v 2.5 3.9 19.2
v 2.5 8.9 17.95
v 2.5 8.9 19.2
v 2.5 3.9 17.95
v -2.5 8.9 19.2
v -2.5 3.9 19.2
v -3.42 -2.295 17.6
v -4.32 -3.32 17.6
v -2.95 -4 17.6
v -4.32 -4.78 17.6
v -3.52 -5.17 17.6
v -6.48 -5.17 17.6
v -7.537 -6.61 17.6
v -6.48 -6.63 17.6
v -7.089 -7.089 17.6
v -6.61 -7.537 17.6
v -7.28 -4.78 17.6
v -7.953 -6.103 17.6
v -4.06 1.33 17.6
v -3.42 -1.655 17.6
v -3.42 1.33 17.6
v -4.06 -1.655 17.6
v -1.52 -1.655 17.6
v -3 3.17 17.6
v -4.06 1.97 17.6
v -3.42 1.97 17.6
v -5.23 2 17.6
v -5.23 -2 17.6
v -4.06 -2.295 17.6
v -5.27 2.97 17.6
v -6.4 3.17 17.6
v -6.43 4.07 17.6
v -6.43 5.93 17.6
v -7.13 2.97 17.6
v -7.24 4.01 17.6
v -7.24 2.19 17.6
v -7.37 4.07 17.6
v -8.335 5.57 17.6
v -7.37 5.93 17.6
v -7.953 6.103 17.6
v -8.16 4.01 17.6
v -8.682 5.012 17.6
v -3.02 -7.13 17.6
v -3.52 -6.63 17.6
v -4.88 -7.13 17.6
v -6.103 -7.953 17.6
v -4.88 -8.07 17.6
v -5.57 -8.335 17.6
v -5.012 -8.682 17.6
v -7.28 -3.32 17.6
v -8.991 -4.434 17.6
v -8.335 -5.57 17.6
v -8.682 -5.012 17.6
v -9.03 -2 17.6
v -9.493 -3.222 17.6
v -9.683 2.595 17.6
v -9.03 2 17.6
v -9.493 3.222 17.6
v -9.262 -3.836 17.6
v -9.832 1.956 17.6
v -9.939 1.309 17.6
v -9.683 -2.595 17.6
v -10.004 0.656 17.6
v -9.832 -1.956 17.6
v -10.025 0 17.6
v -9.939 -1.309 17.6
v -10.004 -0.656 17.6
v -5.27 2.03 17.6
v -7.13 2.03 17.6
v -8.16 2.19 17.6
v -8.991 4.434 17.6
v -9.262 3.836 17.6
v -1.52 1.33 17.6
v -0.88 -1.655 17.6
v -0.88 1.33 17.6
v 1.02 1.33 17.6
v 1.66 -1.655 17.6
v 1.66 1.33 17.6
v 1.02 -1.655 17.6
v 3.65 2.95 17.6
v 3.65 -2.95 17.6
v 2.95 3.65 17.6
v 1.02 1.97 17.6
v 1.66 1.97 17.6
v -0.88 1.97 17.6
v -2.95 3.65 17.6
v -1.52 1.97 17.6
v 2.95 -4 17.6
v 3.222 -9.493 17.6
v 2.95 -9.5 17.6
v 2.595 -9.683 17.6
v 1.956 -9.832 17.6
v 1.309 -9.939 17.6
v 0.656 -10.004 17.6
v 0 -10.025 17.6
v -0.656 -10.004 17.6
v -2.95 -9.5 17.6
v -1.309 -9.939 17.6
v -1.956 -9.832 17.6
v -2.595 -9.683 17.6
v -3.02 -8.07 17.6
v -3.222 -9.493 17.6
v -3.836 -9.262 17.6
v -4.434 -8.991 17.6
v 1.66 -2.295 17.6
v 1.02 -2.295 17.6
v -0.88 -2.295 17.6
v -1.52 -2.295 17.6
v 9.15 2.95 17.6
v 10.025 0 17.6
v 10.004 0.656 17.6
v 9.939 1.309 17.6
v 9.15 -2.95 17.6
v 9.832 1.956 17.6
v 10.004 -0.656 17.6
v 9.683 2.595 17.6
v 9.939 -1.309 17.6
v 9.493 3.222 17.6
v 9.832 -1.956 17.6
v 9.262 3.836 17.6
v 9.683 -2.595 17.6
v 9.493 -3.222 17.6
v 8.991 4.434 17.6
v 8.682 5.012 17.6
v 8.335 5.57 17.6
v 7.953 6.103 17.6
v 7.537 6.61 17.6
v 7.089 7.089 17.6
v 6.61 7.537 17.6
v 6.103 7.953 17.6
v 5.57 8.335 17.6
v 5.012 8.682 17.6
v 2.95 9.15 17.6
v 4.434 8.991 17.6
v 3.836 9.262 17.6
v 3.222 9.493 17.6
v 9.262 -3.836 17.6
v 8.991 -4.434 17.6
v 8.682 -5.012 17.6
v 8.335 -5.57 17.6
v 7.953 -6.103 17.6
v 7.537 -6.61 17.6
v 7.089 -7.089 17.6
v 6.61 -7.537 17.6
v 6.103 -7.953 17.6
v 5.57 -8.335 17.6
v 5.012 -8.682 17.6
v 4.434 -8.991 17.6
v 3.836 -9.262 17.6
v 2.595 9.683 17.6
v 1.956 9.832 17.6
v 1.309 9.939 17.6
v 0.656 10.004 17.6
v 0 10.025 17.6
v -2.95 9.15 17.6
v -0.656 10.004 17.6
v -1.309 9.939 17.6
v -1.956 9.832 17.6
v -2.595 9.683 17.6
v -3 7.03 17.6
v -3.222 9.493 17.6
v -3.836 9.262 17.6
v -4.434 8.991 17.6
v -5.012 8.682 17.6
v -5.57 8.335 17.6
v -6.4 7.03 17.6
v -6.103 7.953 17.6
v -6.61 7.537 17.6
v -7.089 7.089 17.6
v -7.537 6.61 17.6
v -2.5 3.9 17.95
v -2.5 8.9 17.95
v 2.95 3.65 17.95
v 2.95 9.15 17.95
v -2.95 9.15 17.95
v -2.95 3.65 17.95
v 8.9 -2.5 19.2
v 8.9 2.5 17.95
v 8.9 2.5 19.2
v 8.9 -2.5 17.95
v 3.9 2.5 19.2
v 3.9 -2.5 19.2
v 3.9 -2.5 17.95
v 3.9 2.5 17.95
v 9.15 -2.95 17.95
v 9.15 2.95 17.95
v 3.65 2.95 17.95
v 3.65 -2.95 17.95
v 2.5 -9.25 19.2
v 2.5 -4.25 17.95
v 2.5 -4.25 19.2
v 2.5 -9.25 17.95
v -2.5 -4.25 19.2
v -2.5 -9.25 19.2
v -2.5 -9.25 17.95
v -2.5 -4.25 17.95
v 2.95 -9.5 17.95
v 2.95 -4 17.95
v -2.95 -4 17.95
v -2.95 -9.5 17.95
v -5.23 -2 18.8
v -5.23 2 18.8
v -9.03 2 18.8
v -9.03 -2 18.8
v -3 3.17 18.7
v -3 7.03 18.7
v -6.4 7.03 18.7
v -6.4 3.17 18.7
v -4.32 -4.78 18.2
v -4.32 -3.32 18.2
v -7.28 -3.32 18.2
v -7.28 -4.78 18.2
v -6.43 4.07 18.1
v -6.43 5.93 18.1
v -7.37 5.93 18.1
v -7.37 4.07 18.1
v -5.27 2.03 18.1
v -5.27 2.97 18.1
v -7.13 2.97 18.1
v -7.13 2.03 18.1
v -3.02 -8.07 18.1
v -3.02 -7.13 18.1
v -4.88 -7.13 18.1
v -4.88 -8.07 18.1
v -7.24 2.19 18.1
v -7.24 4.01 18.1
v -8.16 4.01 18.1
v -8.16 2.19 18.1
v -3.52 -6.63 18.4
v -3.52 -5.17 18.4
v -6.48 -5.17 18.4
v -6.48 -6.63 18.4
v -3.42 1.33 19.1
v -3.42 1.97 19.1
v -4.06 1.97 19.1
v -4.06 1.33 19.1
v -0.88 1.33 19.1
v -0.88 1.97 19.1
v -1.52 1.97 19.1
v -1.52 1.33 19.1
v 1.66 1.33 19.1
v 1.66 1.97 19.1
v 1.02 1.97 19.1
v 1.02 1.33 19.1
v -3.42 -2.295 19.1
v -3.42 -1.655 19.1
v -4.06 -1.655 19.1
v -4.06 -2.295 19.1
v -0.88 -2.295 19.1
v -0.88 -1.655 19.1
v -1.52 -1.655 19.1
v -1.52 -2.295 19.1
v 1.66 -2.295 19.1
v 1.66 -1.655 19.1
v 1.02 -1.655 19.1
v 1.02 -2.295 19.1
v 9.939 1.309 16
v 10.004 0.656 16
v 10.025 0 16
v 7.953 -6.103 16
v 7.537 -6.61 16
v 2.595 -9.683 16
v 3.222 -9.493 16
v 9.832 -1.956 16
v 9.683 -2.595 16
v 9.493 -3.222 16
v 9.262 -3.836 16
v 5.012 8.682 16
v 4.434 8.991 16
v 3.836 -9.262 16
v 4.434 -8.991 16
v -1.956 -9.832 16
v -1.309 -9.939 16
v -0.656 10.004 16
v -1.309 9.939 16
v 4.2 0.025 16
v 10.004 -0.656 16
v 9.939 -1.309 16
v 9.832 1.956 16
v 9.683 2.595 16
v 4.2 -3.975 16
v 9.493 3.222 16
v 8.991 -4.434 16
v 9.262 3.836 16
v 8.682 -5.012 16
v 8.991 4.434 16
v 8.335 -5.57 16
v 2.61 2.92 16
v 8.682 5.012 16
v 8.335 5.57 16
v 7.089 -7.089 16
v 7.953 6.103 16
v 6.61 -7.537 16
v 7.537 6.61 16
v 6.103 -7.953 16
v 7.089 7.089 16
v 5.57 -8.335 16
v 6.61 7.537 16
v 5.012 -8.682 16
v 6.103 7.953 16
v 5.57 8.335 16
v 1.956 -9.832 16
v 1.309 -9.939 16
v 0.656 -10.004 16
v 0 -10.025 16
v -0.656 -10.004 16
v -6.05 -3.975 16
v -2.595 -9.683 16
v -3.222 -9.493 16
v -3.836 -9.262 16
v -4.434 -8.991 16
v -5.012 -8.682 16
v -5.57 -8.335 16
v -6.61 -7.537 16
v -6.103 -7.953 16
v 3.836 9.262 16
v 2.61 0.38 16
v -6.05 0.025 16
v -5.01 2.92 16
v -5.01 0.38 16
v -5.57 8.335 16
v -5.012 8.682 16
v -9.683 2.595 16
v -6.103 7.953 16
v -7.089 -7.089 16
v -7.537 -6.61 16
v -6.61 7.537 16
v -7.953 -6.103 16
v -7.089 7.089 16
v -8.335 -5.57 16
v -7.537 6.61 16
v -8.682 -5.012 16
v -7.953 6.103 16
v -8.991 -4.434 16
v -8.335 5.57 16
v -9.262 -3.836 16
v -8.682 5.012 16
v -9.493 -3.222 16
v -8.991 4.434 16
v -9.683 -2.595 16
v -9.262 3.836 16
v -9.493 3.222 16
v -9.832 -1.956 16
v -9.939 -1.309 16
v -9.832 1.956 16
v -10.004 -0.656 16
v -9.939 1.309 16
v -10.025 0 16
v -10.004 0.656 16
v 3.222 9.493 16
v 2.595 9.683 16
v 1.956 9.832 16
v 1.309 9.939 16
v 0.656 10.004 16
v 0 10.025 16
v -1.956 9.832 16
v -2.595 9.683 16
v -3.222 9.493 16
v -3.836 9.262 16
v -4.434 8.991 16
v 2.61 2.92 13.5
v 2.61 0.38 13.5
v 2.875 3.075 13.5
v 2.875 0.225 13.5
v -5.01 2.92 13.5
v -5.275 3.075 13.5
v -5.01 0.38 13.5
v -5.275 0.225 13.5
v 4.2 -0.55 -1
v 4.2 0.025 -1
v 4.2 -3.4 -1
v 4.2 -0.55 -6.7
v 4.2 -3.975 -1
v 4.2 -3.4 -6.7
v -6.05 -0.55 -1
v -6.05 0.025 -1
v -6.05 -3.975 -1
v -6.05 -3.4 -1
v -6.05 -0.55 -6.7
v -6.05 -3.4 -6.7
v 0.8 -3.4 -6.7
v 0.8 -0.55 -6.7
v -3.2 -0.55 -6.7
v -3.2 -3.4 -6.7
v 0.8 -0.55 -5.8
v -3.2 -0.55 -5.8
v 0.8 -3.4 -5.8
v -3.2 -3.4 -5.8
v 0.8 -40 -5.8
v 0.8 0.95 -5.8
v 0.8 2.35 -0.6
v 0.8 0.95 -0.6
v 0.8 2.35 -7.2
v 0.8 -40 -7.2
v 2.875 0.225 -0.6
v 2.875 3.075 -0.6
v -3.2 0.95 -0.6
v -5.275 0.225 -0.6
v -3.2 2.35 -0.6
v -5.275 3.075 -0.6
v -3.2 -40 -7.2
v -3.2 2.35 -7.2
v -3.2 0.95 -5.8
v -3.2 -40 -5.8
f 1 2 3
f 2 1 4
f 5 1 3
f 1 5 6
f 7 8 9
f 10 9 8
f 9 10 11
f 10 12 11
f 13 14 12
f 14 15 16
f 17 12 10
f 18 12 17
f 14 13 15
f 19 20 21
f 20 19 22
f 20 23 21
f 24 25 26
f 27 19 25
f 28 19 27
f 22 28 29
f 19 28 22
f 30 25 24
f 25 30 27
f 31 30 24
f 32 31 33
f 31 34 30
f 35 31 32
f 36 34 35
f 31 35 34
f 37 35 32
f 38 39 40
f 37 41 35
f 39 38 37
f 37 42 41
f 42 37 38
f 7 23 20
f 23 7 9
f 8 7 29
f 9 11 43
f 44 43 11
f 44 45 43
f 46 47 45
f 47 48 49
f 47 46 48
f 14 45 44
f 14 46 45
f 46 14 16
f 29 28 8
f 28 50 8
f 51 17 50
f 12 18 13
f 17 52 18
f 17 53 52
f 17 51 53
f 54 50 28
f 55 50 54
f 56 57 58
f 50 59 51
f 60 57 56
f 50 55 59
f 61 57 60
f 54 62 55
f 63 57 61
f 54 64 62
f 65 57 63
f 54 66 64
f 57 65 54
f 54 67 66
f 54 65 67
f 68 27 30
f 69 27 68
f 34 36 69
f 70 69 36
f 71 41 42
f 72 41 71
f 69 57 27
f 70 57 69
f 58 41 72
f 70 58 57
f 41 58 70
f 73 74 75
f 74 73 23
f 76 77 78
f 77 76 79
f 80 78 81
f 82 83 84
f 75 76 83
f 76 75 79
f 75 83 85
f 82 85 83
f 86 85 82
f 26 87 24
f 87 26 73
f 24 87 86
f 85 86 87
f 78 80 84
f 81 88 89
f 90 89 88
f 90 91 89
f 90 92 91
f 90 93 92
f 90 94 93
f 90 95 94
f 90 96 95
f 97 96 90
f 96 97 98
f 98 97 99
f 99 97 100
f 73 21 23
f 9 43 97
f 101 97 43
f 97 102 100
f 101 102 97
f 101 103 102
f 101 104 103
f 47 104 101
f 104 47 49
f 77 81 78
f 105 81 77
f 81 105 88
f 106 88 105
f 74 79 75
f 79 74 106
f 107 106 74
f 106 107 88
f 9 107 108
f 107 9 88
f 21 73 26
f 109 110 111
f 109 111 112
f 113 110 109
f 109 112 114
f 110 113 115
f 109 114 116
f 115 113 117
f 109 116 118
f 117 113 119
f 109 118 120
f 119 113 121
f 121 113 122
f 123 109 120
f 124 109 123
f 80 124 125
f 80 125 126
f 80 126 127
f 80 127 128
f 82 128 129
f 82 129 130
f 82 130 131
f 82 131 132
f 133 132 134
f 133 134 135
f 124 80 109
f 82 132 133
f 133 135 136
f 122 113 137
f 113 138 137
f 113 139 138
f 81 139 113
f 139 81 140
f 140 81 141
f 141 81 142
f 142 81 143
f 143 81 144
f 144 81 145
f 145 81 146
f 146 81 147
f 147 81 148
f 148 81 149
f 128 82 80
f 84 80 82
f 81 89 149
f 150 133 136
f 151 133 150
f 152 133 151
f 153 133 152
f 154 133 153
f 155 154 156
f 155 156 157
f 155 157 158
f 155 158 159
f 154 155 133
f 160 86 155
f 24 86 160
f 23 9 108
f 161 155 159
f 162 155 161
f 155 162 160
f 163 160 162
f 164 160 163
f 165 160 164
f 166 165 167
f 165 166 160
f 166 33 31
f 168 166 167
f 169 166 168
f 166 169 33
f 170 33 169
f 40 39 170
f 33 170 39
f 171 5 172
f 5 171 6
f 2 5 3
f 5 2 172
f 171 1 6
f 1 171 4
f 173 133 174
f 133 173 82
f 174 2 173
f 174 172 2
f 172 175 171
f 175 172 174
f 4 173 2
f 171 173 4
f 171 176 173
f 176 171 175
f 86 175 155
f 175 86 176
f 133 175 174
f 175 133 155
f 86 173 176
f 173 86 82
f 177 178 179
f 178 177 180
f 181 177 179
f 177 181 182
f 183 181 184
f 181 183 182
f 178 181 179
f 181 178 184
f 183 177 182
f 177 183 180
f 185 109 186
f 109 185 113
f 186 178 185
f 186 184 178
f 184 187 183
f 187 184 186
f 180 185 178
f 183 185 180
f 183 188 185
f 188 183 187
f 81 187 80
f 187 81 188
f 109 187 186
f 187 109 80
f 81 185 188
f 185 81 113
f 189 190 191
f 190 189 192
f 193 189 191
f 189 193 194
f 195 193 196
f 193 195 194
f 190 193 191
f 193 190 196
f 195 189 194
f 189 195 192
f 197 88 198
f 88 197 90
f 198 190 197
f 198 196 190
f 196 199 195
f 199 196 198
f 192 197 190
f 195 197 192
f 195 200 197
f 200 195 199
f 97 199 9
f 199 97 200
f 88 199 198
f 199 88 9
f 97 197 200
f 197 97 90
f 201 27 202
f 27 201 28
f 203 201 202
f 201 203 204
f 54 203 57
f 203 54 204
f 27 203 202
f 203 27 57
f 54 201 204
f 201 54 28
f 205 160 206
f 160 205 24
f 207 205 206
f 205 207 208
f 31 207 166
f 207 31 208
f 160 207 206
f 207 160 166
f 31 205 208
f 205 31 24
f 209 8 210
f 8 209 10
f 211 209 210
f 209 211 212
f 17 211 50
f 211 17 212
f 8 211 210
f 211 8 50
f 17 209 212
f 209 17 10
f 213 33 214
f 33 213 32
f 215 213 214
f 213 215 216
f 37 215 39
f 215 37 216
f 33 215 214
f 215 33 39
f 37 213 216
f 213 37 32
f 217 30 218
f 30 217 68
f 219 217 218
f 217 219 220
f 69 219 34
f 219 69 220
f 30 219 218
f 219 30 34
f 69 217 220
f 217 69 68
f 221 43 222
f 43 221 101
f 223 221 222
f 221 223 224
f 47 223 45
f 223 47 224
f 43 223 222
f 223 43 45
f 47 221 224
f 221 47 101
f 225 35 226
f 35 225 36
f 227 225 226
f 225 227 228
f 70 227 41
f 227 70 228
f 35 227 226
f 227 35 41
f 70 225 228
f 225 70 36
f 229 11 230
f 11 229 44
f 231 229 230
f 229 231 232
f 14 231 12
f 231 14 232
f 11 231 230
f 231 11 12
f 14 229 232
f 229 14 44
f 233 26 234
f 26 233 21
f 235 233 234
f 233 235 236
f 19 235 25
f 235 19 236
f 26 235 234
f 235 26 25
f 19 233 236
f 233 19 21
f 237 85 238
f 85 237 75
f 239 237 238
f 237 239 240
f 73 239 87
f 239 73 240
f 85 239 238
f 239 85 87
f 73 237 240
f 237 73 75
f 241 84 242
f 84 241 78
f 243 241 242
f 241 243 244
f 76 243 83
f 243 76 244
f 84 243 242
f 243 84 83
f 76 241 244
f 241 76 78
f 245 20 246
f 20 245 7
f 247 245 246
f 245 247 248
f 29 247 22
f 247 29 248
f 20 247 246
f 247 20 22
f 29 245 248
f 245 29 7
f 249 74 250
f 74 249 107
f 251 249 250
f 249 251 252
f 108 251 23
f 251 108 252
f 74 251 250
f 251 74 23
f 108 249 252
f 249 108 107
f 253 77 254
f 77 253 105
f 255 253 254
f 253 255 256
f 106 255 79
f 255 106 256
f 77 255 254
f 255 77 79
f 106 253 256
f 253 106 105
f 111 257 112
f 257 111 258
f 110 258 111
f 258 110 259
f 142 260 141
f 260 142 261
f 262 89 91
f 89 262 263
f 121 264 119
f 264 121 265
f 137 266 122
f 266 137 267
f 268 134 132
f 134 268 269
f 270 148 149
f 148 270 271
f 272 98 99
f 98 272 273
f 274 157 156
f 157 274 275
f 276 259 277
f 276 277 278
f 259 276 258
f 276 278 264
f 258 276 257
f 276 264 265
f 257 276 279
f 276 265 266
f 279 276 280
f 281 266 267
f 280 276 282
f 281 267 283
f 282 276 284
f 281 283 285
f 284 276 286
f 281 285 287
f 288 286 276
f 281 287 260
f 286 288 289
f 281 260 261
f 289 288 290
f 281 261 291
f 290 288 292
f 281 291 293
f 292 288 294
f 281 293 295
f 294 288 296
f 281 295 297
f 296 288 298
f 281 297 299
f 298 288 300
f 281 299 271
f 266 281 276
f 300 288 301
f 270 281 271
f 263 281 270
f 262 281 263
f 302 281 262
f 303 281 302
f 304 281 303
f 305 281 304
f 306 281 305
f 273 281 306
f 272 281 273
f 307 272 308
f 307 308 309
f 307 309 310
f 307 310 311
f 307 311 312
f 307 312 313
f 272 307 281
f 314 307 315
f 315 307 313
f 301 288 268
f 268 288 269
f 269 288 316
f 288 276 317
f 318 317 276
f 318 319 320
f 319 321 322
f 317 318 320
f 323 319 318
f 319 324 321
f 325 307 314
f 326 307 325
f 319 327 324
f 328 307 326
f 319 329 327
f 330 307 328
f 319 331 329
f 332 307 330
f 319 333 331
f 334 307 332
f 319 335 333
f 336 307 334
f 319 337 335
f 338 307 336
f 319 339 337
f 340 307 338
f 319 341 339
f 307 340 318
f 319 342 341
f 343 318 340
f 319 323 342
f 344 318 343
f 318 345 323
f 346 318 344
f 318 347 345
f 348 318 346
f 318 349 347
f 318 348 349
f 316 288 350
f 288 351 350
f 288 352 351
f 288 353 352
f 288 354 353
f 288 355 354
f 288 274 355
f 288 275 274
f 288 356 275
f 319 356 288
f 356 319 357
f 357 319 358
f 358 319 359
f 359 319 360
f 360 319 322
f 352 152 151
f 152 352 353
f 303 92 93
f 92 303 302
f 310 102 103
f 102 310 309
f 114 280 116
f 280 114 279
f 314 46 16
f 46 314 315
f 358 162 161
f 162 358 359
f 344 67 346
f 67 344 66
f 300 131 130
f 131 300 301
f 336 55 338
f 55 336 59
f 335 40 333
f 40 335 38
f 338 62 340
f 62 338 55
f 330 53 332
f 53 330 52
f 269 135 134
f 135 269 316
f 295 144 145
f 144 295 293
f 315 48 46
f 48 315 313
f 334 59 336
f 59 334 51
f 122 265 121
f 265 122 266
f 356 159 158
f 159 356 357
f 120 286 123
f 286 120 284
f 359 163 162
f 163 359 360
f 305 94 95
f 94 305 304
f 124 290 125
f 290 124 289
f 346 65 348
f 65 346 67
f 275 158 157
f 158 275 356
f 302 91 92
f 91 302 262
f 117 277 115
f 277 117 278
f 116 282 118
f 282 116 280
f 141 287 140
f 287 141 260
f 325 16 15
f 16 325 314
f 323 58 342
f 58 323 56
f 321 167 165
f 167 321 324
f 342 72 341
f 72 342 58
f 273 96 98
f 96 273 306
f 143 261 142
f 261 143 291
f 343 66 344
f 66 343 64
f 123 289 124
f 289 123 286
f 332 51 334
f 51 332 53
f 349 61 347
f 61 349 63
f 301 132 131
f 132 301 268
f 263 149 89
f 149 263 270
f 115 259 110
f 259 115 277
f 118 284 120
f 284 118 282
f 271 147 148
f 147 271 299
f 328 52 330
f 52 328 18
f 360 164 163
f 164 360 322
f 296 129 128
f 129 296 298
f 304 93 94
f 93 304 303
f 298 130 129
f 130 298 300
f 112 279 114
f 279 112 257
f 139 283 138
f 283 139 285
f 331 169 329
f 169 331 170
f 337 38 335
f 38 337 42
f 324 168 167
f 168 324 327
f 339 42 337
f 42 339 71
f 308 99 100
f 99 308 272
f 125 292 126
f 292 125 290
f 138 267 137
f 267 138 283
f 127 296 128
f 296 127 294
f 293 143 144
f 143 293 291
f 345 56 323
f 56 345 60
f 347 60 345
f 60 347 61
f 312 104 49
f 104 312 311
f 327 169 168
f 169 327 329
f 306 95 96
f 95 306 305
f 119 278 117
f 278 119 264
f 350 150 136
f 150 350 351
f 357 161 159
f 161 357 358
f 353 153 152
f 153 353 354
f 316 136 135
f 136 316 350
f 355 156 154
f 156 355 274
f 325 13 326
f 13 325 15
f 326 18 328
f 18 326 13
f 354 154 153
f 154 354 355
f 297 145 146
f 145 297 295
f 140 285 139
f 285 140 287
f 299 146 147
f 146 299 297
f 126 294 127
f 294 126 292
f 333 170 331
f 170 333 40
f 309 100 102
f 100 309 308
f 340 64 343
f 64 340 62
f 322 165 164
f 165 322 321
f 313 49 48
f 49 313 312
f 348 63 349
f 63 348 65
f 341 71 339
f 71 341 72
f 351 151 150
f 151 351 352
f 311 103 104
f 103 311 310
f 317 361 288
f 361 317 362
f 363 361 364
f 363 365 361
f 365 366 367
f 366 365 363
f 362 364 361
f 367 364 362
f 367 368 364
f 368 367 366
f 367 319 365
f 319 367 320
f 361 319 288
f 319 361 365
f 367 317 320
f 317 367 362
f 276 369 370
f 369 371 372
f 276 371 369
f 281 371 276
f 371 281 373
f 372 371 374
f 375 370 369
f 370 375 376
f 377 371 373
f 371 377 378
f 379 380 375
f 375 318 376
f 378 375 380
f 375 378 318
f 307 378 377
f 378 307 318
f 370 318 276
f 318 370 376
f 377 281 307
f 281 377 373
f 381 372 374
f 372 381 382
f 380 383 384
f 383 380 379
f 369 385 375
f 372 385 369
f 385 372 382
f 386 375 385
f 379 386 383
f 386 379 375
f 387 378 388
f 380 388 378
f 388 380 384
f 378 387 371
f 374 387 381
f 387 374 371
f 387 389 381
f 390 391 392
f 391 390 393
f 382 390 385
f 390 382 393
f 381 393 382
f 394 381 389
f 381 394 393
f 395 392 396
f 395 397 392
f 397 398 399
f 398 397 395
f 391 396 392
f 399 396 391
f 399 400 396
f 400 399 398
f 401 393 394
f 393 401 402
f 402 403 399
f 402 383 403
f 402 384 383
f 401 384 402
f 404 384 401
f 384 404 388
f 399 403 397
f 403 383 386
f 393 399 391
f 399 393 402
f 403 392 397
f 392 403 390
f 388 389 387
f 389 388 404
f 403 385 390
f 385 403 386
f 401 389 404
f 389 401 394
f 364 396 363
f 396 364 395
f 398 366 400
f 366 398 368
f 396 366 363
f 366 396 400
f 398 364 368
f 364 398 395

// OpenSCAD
// file: params.scad
// Shared dimensions for the Pixel PCB house holder (v0.3). Units: mm.
//
// Coordinates: Z = 0 is the house wall's outer face (the face the flange
// presses against). +Z points into the house. +Y is "north" on the Pixel PCB
// (KiCad -Y), and -Y ("south") points toward the cord notch.
//
// Layout (vertical headers):
// - Clip ring: 3 short XY-flexing arms with a gentle bore-friction crown
//   (Ø29.0 mm universal fit across Ø25-28 mm houses; S/L kept as options).
//   `arm_rot = 50` centers the 40 deg open arm gap directly on 270 deg (-Y) so
//   both south cable channels open straight into the central bore with no wall.
// - Upper PCB cradle: two wide, thick curved C-jaws (supported on 37 deg wide
//   solid pillars, flexing ~0.2 mm in XY rather than across Z-layers) receive
//   the PCB horizontally from the open south (-Y) mouth at Z = 16 mm.
// - Blind-mate C-cheeks (Z = -3.8 .. +7.1 mm) guide J1/J2 plugs from below
//   while staying 0.4 mm below the bare headers so a soldered PCB slides in.
// - Extended south pull-tab (-24.2 mm) houses two unobstructed full-wave
//   serpentine (S-bend) cable cleats.

$fn = 96;

// ---------------------------------------------------------------------------
// House envelope (measured houses: hole Ø25-28 mm, wall 3-8 mm, inlet 12-13).
// ---------------------------------------------------------------------------
hole_min   = 25.0; // smallest measured house hole
hole_sweep = 24.5; // bore used for worst-case arm-sweep clearance checks
hole_mid   = 26.5;
hole_max   = 28.0; // largest measured house hole (28.3 on printed v0.1 rings)
wall_min   = 3.0;  // thinnest wall at the hole (3 measured)
wall_max   = 8.5;  // thickest wall at the hole (8 measured, plus margin)
inlet_min  = 12.0; // shallowest bottom recess measured (12-13 on 3 houses)
inside_max = 25.0; // how far the holder may reach into the house (README)

// ---------------------------------------------------------------------------
// Clip ring: flange + short bore-friction arms. Printed flange down, no supports.
// ---------------------------------------------------------------------------
flange_t  = 3.8;   // flange thickness (houses 3.25 mm deep serpentine cable slots)
flange_od = 34.0;  // flange outer diameter
flange_id = 25.4;  // flange inner diameter (clears arm undersides with >=0.45 gap)

arm_n        = 3;     // number of arms
arm_r_in     = 10.4;  // arm inner radius at rest (PCB is r 10.025)
arm_w        = 0.84;  // arm radial thickness: two 0.42 mm Arachne outlines
arm_root_ang = 14;    // angular width of each arm's root block
arm_ang      = 66;    // flexing arc (~12.5 mm); leaves a 40 deg open gap
arm_rot      = 50;    // puts Gap 1 across 250..290 deg (dead center on -Y south
                      // cable exit: x = +/-4.34 mm completely clear of roots/arms)
crown_ang    = 18;    // angular width of the bore-contact pad near the arm tip

// Bore-pad profile in (radius, Z). Coupon v0.2 proved Ø28.7 (M) and Ø29.2 (L)
// both fit every tested house from Ø25 to Ø28; Ø29.0 (`crown_r_u = 14.50`) is
// the single universal default, with S and L retained for outliers.
crown_r_s     = 13.65; // Size S (Ø27.3): outlier holes < Ø25 mm
crown_r_m     = 14.35; // Coupon v0.2 M (Ø28.7)
crown_r_u     = 14.50; // Universal v0.3 default (Ø29.0)
crown_r_l     = 14.60; // Coupon v0.2 L (Ø29.2)
crown_r_def   = crown_r_u;
crown_z0_r    = 12.25; // max radius at Z <= 0 (0.45 mm inside flange_id/2 = 12.70)
crown_top_z   = 4.4;   // top of the flat bore-contact land
lead_in_deg   = 34;    // insertion ramp above crown_top_z, degrees from vertical

// ---------------------------------------------------------------------------
// Pixel PCB with VERTICAL headers ("stacked" v0.2 header layout).
// ---------------------------------------------------------------------------
pcb_d = 20.05;     // measured outline; ordered at +/-0.2 mm
pcb_t = 1.6;
led_h = 1.6;       // HL-5050 package height (typical 5050)

layout    = "stacked";
stack_dx  = -1.20; // Pixel v0.2 header stack X offset (west) in holder coords
stack_dy  = -0.45; // Pixel v0.2 header stack Y offset (south, toward cord notch)
pin_gap   = 9.4;
v02_row_y = 0;
plug_gap  = 0.2;

// Vertical header bodies below the board (XFCN C2937625 male, C541850 female).
j1_body_w = 7.62;
j1_body_h = 2.5;
j2_body_w = 8.12;
j2_body_h = 8.5;
hdr_t     = 2.54;

// ---------------------------------------------------------------------------
// Servo plugs: measured on the purchased cables, 2026-11-14.
// ---------------------------------------------------------------------------
pf_w = 8.15;
pf_t = 2.85;
pf_l = 14.1;

pm_w          = 10.25;
pm_t          = 4.0;
pm_sleeve_l   = 17;
pm_neck_t     = 2.85;
pm_l          = 22.7;
pm_engage     = 9.3;
pm_pin_recess = 3.1;
pm_dx         = (1.4 - 0.85) / 2;
pm_dx_sign    = 1;   // settled in Pixel v0.2: J2 has DATA_OUT on the east (+X) pin

cable_w      = 4.0;
cable_t      = 1.4;
cable_bend_d = 4;

// Pin rows (bottom side), in model coordinates (KiCad Y is flipped: Y_kicad = -Y).
// Settled Pixel v0.2 ("stacked"): J1 = (-1.20, +1.650), J2 = (-1.20, -1.975).
stack_sep  = pf_t / 2 + plug_gap + pm_t / 2;   // 3.625
j1_x = layout == "v0.1" ? -4.35
     : layout == "side" ? -(pin_gap + pm_w / 2 - pf_w / 2) / 2 : stack_dx;
j2_x = layout == "v0.1" ?  4.54
     : layout == "side" ? j1_x + pin_gap : stack_dx;
stack_j2_y = -(stack_sep + pf_t / 2 - pm_t / 2) / 2; // -1.525 before stack_dy
j1_y = layout == "v0.1" ? 4.0 : layout == "side" ? v02_row_y : stack_j2_y + stack_sep + stack_dy; // +1.650
j2_y = layout == "v0.1" ? 4.0 : layout == "side" ? v02_row_y : stack_j2_y + stack_dy;             // -1.975

j1_stack    = j1_body_h + pf_l;                      // 16.6
j2_stack    = pm_l + max(0, j2_body_h - pm_engage);  // 22.7
j2_pin_mate = min(j2_body_h, pm_engage) - pm_pin_recess; // 5.4

// ---------------------------------------------------------------------------
// Holder upper structure: sturdy XY-flexing C-jaws, C-cheeks, south S-cleat.
// ---------------------------------------------------------------------------
pcb_bot = 16.0;    // LEDs at 19.2 mm; J2 extends to Z = -6.7 (2.9 mm below flange)
pcb_top = pcb_bot + pcb_t;

// Curved PCB cradle jaws: two wide thick arcs (`-11..+76` East-North and
// `+104..+191` West-North) supported on 37 deg solid pillars (`27..64` and
// `147..184`). PCB slides horizontally into the -Y mouth (`~0.18 mm/side` XY
// snap past the detent tips; zero Z-layer bending).
pillar_r_in  = 8.95;  // inner radius of the two wide structural pillars
jaw_r_pocket = 10.10; // PCB pocket inner radius (ID 20.20; -12/+192 mouth chord = 19.76)
jaw_r_out    = 12.45; // outer radius of the upper C-jaw wall (~2.35 mm thick)
ledge_r      = 9.35;  // bottom ledge supporting the PCB edge
hook_r       = 9.52;  // 45 deg upper capture lip radius (clears all v0.2 courtyards)

// Stepped C-shaped plug guide cheeks (Z = -flange_t .. guide_top_z).
// Validated smooth fit in coupon v0.2. `guide_top_z = 7.1` stays 0.4 mm below
// the bare soldered headers (Z = 7.5) so a soldered PCB slides straight in from
// -Y, then mating the plugs locks PCB + holder together across Z = 7.1..16.0.
guide_top_z   = 7.1;
guide_trim_r  = 9.45;  // outer cheek trim radius around (0, 0); clears squeezed Arm 1
guide_j1_hw   = pf_w / 2 + 0.425;                 // 4.50 mm half-width around j1_x
guide_j2_hw   = pm_w / 2 + pm_dx + 0.40;          // 5.80 mm half-width around j2_x
guide_y_n     = j1_y + pf_t / 2 + 0.425;          // +3.50 mm (with stack_dy = -0.45)
guide_y_s     = j2_y - pm_t / 2 - 0.425;          // -4.40 mm (with stack_dy = -0.45)
guide_open_n  = 2.8;
guide_open_s  = 3.4;

// Shortened south (-Y) pull-tab (`-21.5 mm`, 2.7 mm shorter than coupon v0.3
// so it clears Yankee Candle's bottom recess edge) with full-2-curve S-cleats.
tab_y_end    = -21.5; // 4.5 mm south tab (proven recess fit in coupon v0.2)
tab_x_spread = 4.8;   // tighter corner fillets for extra recess wall clearance
tab_corner_d = 7.0;
cleat_x      = 2.85;  // +/-X centerline (fits cleanly inside 250..290 deg south gap)
cleat_amp    = 0.85;  // lateral S-wave amplitude (~3.8 mm min bend diameter)
cleat_wave_l = 7.6;   // wavelength -> 1.30 full waves inside y = -12.0 .. -21.9
cleat_w      = 1.68;  // slot width for 1.4 mm flat servo ribbon
cleat_h_wall = 2.45;  // vertical wall before 45 deg peaked roof
// main file
// Mock-up of a Pixel PCB v0.2 fitted with vertical headers and both servo
// plugs mated, for clearance checks only (not printed). Part outlines come
// from `hardware/pixel/pixel.kicad_pcb` (PR #17), flipped into holder model
// coordinates (`Y = -KiCad_Y`). For the three 5x5 mm LEDs (D2-D4), both the
// 5.0 x 5.0 x 1.6 mm package body and the low-profile pad/lead courtyard
// (~0.35 mm) are modeled so 3D lip clearances match physical reality.

include <params.scad>

// [x0, y0, x1, y1, height] in KiCad coordinates relative to board center (100, 100).
top_parts = [
    // 5.0 x 5.0 x 1.6 mm LED bodies (F.Fab) + 0.35 mm pad/lead envelopes (F.CrtYd)
    [-2.50, -8.90,  2.50, -3.90, led_h], // D2 (north) body, r_max 9.24
    [-2.95, -9.15,  2.95, -3.65, 0.35],  // D2 pads/leads
    [ 3.90, -2.50,  8.90,  2.50, led_h], // D3 (east) body, r_max 9.24
    [ 3.65, -2.95,  9.15,  2.95, 0.35],  // D3 pads/leads
    [-2.50,  4.25,  2.50,  9.25, led_h], // D4 (south) body, r_max 9.58 (in open mouth)
    [-2.95,  4.00,  2.95,  9.50, 0.35],  // D4 pads/leads
    // Remaining SMT parts (full KiCad F.CrtYd courtyards)
    [-9.03, -2.00, -5.23,  2.00, 1.2],   // U1 (WS2814F)
    [-6.40, -7.03, -3.00, -3.17, 1.1],   // D1 (BAT54S)
    [-7.28,  3.32, -4.32,  4.78, 0.6],   // R1 (2.7k)
    [-7.37, -5.93, -6.43, -4.07, 0.5],   // R2 (4.7k)
    [-7.13, -2.97, -5.27, -2.03, 0.5],   // R3 (100)
    [-4.88,  7.13, -3.02,  8.07, 0.5],   // R4 (120)
    [-8.16, -4.01, -7.24, -2.19, 0.5],   // C1 (100n)
    [-6.48,  5.17, -3.52,  6.63, 0.8],   // C2 (1u 50V)
];

module kicad_box(b, z0) {
    translate([b[0], -b[3], z0]) cube([b[2] - b[0], b[3] - b[1], b[4]]);
}

module hanging_box(x, y, w, t, z_top, h) {
    translate([x - w / 2, y - t / 2, z_top - h]) cube([w, t, h]);
}

// Board, top-side parts and the pin tails on the LED side (~1.5 mm).
module mock_board() {
    color("darkgreen") translate([0, 0, pcb_bot]) cylinder(d = pcb_d, h = pcb_t);
    color("white") for (b = top_parts) kicad_box(b, pcb_top);
    color("gold") for (p = [[j1_x, j1_y], [j2_x, j2_y]], dx = [-2.54, 0, 2.54])
        translate([p[0] + dx - 0.32, p[1] - 0.32, pcb_top]) cube([0.64, 0.64, 1.5]);
}

module mock_headers() {
    color("black") {
        hanging_box(j1_x, j1_y, j1_body_w, hdr_t, pcb_bot, j1_body_h);
        hanging_box(j2_x, j2_y, j2_body_w, hdr_t, pcb_bot, j2_body_h);
    }
}

// Female plug on J1's pins.
module j1_plug() {
    color("dimgray") hanging_box(j1_x, j1_y, pf_w, pf_t, pcb_bot - j1_body_h, pf_l);
}

// Male plug's sleeve over J2's socket.
module j2_plug() {
    j2_mouth = pcb_bot - max(0, j2_body_h - pm_engage);
    color("dimgray") {
        hanging_box(j2_x + pm_dx_sign * pm_dx, j2_y, pm_w, pm_t, j2_mouth, pm_sleeve_l);
        hanging_box(j2_x + pm_dx_sign * pm_dx, j2_y, pm_w, pm_neck_t, j2_mouth - pm_sleeve_l, pm_l - pm_sleeve_l);
    }
}

// Cables: straight down out of each plug, then bent outward under the flange
// toward 270 degrees (-Y).
module mock_cables() {
    color("red") for (p = [[j1_x, j1_y, j1_stack], [j2_x, j2_y, j2_stack]]) {
        z_end = pcb_bot - p[2];
        hanging_box(p[0], p[1], cable_w, cable_t, z_end, z_end + flange_t + 2 + cable_t);
        translate([p[0] - cable_w / 2, -40, -flange_t - 2 - cable_t])
            cube([cable_w, 40 + p[1], cable_t]);
    }
}

module pixel_mock() {
    mock_board();
    mock_headers();
    j1_plug();
    j2_plug();
    mock_cables();
}

pixel_mock();
